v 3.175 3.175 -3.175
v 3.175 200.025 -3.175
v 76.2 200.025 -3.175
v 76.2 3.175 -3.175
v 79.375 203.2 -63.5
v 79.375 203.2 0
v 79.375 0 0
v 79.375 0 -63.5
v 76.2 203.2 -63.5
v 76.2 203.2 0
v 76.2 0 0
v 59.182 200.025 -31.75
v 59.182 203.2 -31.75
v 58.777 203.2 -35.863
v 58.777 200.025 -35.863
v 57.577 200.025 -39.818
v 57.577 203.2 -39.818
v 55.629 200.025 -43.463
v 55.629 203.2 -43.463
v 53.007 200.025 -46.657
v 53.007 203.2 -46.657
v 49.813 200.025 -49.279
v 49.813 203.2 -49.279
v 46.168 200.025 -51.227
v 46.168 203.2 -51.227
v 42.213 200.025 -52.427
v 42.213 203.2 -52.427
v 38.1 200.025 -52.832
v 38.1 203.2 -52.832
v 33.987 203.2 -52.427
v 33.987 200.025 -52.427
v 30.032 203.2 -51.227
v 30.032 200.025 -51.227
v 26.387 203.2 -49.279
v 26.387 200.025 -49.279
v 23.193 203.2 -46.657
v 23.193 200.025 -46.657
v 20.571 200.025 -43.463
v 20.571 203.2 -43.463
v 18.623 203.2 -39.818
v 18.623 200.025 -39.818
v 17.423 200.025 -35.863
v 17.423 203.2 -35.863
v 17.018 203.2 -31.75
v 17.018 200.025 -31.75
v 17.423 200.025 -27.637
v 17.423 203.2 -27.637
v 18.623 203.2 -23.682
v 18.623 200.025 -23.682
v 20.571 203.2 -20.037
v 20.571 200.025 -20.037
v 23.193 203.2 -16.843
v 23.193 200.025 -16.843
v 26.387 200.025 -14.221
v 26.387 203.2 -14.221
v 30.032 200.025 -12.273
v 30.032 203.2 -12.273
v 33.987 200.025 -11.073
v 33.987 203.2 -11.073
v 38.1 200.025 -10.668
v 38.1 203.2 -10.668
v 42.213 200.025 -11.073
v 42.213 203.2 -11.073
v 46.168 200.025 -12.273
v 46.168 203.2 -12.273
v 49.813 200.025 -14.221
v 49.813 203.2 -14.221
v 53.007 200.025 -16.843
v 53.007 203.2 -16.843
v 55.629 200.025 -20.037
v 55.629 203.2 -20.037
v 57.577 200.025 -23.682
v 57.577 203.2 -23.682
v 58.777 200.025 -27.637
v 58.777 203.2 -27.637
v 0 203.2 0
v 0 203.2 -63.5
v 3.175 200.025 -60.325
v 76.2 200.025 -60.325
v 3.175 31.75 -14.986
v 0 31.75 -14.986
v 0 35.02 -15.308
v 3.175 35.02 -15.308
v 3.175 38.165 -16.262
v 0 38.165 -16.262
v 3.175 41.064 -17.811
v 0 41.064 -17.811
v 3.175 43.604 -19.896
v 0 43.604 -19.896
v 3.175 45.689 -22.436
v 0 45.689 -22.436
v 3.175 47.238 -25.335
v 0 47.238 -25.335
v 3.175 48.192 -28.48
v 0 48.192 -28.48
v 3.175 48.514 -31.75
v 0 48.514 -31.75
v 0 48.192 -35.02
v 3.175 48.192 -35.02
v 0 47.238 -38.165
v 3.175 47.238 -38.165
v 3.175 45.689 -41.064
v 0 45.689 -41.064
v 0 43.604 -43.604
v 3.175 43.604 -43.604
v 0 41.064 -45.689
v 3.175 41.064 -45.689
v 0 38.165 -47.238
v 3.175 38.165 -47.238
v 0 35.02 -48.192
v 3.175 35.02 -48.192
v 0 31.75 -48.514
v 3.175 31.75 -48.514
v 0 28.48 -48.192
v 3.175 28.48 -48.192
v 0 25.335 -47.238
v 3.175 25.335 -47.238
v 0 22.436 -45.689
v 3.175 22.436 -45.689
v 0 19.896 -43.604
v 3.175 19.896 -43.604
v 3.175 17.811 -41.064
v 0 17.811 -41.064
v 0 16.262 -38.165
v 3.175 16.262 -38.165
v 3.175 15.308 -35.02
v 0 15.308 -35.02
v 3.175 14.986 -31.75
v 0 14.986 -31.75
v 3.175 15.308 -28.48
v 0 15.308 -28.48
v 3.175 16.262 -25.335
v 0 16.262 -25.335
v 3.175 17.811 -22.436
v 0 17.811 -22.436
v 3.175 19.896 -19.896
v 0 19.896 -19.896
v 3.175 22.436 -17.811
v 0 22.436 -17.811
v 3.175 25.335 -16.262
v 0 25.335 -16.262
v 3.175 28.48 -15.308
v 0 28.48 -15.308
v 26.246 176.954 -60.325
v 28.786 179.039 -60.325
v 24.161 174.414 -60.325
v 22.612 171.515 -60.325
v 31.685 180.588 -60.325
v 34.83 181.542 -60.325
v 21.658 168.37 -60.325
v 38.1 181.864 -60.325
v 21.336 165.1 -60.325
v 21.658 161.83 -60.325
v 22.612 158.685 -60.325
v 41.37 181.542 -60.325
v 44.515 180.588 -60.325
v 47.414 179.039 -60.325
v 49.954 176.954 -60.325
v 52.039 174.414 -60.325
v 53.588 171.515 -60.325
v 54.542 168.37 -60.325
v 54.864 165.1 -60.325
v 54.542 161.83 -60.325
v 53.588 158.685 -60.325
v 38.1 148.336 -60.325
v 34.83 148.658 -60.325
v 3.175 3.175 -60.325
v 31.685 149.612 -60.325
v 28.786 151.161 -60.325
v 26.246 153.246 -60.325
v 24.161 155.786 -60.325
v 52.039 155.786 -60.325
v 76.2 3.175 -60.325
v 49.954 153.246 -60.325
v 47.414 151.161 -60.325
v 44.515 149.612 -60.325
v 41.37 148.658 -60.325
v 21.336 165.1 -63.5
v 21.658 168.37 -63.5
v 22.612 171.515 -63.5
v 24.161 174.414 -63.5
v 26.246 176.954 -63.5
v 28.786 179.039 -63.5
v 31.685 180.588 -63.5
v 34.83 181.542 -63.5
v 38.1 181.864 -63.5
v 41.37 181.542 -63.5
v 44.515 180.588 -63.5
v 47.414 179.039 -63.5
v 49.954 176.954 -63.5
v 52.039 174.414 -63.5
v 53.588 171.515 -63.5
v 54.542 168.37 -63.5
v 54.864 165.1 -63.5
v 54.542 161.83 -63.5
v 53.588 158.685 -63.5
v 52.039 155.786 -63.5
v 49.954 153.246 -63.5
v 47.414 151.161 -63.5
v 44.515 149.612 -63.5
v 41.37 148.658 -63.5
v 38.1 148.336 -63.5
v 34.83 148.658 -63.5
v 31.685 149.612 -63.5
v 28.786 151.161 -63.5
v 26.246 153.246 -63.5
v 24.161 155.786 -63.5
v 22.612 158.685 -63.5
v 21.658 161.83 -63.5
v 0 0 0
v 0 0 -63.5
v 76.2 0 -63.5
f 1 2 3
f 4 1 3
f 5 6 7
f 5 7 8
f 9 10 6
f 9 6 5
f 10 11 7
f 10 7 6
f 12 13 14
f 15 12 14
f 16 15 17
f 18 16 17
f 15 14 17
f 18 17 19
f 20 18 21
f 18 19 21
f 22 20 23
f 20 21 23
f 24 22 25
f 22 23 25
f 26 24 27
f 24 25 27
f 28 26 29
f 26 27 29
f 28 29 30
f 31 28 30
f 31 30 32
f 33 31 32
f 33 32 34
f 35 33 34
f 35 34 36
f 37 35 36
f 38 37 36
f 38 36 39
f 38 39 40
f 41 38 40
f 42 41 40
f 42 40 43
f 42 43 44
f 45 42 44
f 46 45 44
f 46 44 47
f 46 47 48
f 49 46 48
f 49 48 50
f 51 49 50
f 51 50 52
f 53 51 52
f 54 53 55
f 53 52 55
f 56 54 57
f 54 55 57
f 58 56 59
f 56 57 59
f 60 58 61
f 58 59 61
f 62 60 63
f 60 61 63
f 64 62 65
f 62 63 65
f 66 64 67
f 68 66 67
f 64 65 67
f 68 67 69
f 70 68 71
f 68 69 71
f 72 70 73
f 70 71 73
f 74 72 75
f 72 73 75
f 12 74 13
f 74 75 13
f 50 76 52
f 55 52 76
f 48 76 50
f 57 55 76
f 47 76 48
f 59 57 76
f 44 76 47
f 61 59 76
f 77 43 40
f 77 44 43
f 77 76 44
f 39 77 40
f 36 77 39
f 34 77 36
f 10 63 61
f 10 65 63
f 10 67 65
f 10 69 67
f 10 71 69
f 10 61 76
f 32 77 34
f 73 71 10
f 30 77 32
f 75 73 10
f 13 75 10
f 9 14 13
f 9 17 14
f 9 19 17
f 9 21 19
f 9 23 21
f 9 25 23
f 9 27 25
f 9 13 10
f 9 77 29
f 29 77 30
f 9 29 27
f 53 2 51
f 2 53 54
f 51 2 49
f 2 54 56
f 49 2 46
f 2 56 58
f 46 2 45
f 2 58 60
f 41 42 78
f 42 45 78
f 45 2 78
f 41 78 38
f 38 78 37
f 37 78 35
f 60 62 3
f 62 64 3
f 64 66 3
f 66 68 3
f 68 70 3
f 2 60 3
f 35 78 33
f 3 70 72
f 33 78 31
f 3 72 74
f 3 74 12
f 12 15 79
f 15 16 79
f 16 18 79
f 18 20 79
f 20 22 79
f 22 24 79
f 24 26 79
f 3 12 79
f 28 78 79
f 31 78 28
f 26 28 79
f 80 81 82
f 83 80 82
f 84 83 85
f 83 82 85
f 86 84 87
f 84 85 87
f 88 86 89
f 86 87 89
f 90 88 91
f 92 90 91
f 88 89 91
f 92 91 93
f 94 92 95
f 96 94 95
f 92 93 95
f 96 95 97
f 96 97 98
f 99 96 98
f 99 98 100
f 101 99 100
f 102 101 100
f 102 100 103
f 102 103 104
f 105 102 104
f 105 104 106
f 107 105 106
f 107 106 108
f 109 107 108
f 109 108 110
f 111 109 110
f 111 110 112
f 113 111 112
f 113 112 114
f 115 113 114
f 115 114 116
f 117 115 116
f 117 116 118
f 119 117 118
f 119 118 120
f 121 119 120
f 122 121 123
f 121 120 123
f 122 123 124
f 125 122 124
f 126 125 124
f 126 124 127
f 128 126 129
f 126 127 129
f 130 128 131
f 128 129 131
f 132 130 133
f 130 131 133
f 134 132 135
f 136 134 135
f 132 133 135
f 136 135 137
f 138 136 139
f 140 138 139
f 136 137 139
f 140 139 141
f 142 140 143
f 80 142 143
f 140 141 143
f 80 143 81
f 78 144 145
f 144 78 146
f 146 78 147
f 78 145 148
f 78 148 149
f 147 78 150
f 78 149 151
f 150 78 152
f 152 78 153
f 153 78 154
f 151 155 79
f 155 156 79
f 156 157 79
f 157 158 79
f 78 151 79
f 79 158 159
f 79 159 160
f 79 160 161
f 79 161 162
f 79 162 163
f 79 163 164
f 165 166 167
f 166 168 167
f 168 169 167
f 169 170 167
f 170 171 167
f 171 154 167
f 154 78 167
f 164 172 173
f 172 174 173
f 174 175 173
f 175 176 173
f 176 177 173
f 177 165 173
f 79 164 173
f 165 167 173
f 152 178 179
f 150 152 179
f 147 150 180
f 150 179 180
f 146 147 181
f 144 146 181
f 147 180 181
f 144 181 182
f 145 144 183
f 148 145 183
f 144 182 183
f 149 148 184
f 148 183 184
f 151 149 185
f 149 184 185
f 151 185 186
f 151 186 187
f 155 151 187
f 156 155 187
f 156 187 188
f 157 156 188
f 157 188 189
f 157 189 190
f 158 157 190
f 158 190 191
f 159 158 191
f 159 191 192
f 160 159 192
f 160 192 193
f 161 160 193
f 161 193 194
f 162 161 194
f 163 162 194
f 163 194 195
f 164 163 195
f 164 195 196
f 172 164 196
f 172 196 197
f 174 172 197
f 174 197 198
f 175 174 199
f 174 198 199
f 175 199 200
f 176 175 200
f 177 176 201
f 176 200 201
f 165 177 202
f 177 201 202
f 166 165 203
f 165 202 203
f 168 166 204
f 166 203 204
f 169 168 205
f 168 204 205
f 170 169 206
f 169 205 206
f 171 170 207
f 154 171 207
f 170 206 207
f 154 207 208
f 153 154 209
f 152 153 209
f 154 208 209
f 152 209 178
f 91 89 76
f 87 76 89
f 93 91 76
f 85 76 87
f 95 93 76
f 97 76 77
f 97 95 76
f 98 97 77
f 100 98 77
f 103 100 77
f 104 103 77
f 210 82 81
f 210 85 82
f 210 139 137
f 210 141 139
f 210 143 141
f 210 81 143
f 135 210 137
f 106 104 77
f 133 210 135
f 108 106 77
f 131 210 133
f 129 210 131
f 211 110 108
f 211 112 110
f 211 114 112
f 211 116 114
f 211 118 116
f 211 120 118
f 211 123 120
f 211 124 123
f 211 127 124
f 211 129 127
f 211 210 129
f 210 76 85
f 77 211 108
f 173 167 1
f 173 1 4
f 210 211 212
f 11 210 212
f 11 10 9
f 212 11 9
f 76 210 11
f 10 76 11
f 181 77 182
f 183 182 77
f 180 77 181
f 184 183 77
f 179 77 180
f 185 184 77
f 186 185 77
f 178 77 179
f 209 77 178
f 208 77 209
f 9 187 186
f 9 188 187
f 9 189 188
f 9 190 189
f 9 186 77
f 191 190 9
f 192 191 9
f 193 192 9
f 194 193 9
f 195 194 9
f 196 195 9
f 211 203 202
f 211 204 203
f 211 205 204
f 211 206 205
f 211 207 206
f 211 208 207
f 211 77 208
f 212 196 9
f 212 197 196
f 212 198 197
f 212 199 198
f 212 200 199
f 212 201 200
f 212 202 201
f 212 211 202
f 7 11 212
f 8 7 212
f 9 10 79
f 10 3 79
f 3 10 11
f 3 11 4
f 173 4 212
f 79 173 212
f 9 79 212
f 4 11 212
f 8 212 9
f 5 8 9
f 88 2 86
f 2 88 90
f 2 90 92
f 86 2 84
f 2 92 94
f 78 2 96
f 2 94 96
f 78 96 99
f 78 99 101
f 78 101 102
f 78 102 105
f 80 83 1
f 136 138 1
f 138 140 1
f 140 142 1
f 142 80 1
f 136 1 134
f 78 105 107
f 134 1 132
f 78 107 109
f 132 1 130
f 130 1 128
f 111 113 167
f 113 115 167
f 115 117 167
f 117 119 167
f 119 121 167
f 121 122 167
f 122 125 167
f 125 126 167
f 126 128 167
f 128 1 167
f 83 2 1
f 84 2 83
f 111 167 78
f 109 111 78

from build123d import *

# Parameters (mm, degrees)
SKETCH1_W           = 76.2
SKETCH1_H           = 63.5
BOSS_EXTRUDE1_DEPTH = 203.2
SHELL1_T            = -3.175
CUT_EXTRUDE1_REACH  = 205.2
SKETCH2_R           = 21.082
CUT_EXTRUDE2_REACH  = 65.5
SKETCH3_R           = 16.764
CUT_EXTRUDE3_REACH  = 78.2
SKETCH4_R           = 16.764
SKETCH5_W           = 63.5
SKETCH5_H           = 203.2
BOSS_EXTRUDE2_DEPTH = 3.175


with BuildPart() as part:
    # Sketch1 → Boss-Extrude1 (new body)
    with BuildSketch(Plane(origin=(0, 0, 0), x_dir=(1, 0, 0), z_dir=(0, 1, 0))):
        with Locations((38.1, 31.75)):
            Rectangle(SKETCH1_W, SKETCH1_H)
    extrude(amount=BOSS_EXTRUDE1_DEPTH)

    # Shell1
    shell1_openings = [part.faces().sort_by_distance(p)[0] for p in [
        (76.2, 101.6, -31.75),
    ]]
    offset(amount=SHELL1_T, openings=shell1_openings, kind=Kind.INTERSECTION)

    # Sketch2 → Cut-Extrude1 (cut, up to next)
    with BuildSketch(Plane(origin=(0, 203.2, 0), x_dir=(1, 0, 0), z_dir=(0, 1, 0)), mode=Mode.PRIVATE) as cut_extrude1_sk1:
        with Locations((38.1, 31.75)):
            Circle(SKETCH2_R)
    cut_extrude1_tool1 = extrude(cut_extrude1_sk1.sketch, amount=-CUT_EXTRUDE1_REACH, mode=Mode.PRIVATE) & part.part
    add(cut_extrude1_tool1.solids().sort_by_distance((38.1, 203.2, -31.75))[0], mode=Mode.SUBTRACT)

    # Sketch3 → Cut-Extrude2 (cut, up to next)
    with BuildSketch(Plane(origin=(0, 0, -63.5), x_dir=(-1, 0, 0), z_dir=(0, 0, -1)), mode=Mode.PRIVATE) as cut_extrude2_sk1:
        with Locations((-38.1, 165.1)):
            Circle(SKETCH3_R)
    cut_extrude2_tool1 = extrude(cut_extrude2_sk1.sketch, amount=-CUT_EXTRUDE2_REACH, mode=Mode.PRIVATE) & part.part
    add(cut_extrude2_tool1.solids().sort_by_distance((38.1, 165.1, -63.5))[0], mode=Mode.SUBTRACT)

    # Sketch4 → Cut-Extrude3 (cut, up to next)
    with BuildSketch(Plane.ZY, mode=Mode.PRIVATE) as cut_extrude3_sk1:
        with Locations((-31.75, 31.75)):
            Circle(SKETCH4_R)
    cut_extrude3_tool1 = extrude(cut_extrude3_sk1.sketch, amount=-CUT_EXTRUDE3_REACH, mode=Mode.PRIVATE) & part.part
    add(cut_extrude3_tool1.solids().sort_by_distance((0, 31.75, -31.75))[0], mode=Mode.SUBTRACT)


with BuildPart() as body_2:
    # Sketch5 → Boss-Extrude2 (new body)
    with BuildSketch(Plane(origin=(76.2, 0, 0), x_dir=(0, 0, -1), z_dir=(1, 0, 0))):
        with Locations((31.75, 101.6)):
            Rectangle(SKETCH5_W, SKETCH5_H)
    extrude(amount=BOSS_EXTRUDE2_DEPTH)


solid = Compound([part.part, body_2.part])
